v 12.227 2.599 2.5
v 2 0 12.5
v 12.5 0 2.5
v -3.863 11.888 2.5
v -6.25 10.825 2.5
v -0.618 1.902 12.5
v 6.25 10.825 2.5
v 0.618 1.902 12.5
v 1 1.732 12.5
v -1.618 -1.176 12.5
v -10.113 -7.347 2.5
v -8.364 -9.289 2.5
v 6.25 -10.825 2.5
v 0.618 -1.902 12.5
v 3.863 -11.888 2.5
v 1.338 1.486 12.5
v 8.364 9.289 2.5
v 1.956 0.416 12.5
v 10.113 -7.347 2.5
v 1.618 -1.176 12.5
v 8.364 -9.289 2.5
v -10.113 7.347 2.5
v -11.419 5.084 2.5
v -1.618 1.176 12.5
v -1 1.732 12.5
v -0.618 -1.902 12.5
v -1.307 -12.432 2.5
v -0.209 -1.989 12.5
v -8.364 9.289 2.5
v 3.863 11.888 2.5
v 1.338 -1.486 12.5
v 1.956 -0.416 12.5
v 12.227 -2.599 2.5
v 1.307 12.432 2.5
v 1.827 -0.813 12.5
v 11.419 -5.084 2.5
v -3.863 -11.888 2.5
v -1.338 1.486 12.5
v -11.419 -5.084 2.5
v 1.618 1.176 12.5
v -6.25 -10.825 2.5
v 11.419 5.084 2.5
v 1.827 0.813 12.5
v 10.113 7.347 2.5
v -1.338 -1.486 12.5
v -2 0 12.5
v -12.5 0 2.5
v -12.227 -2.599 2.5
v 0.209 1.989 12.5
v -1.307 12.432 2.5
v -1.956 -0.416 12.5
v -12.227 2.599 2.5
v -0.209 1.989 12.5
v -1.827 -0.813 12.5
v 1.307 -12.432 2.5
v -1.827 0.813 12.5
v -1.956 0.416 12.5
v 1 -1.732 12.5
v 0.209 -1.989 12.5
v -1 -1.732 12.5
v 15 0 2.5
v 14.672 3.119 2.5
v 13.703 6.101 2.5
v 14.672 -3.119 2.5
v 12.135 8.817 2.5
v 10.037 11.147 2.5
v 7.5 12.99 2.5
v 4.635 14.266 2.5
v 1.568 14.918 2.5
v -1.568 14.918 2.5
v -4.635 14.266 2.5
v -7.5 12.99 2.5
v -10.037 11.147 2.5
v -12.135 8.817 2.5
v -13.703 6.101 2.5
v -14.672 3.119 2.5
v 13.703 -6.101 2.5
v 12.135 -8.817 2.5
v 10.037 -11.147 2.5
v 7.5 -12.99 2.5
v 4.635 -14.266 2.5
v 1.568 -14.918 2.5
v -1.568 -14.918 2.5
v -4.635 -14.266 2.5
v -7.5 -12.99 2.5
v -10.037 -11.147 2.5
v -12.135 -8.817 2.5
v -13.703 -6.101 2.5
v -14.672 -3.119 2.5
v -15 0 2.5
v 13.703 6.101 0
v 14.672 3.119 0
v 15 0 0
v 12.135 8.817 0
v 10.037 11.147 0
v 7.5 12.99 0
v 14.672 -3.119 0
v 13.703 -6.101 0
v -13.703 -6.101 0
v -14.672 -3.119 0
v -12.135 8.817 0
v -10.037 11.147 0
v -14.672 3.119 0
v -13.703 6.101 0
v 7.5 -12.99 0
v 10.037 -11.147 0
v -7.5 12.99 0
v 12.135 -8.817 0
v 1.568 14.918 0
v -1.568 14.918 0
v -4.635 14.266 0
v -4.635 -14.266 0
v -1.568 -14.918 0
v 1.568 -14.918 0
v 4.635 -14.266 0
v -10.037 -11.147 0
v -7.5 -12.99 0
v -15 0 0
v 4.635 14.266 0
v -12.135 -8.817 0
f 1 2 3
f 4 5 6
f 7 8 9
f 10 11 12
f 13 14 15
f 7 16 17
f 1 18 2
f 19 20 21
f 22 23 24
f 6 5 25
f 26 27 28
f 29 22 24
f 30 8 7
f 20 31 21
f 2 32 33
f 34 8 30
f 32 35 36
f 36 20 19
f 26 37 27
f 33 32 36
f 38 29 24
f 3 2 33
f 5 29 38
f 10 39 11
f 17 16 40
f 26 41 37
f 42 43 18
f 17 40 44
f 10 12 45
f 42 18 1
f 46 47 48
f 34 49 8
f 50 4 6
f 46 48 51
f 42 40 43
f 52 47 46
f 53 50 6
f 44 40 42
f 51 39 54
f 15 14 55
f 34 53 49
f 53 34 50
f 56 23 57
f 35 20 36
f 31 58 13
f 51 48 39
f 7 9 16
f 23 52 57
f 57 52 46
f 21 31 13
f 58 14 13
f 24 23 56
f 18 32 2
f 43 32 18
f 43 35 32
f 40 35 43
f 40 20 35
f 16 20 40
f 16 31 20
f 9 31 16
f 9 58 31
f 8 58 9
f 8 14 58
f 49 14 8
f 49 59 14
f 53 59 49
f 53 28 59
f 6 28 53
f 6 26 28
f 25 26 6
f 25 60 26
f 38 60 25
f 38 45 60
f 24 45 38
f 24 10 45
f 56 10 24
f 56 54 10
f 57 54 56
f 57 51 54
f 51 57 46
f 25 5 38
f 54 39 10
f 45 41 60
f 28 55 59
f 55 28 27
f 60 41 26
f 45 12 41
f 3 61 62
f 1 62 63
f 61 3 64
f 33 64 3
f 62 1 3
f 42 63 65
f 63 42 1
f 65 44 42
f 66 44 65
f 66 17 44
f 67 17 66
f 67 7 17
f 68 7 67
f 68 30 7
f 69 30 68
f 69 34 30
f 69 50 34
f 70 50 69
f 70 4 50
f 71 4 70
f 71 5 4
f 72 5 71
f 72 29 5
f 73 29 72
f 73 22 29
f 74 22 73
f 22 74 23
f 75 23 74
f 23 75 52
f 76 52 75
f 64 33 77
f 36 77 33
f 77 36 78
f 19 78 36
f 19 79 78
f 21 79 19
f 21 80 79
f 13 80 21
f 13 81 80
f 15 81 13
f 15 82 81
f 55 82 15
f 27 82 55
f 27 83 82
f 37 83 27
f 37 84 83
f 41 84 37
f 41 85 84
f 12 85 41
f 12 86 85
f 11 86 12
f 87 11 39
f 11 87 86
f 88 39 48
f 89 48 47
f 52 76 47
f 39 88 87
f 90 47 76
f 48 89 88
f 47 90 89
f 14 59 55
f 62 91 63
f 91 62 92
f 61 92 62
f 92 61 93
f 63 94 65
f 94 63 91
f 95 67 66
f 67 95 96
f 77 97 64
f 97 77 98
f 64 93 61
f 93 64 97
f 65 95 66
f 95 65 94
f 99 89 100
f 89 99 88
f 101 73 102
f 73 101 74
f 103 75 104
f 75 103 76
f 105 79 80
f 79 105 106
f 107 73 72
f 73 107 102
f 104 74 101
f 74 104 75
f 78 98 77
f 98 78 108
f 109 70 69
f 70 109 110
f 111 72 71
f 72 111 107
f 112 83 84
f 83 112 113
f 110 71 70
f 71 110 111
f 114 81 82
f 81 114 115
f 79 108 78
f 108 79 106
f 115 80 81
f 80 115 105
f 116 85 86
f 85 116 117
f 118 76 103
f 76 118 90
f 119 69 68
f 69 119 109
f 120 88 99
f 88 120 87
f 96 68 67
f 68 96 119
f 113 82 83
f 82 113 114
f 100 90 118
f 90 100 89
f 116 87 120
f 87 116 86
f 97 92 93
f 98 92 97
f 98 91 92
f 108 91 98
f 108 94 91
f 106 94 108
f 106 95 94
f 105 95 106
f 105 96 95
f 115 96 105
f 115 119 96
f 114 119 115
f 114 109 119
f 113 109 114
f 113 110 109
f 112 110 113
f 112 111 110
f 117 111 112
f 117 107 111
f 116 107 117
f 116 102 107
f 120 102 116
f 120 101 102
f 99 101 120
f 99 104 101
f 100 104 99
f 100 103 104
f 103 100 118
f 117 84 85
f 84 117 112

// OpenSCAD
// Customizable spiked device foot
// Created by Kjell Kernen
// Date 14.1.2017

/*[Foot Parameters]*/

// of the foot in tens of mm:
base_height=25;// [0:200]

// of the foot in tens of mm:
base_overhang=25;// [0:30]

// of the spike in tens of mm:
diameter=250;      // [50:500]

// of the spike in tens of mm:
height=100;       // [50:500]

/*[Hidden]*/


union()
{
    translate([0,0,base_height/10]) cylinder(r=2, h=height/10, r1=diameter/20);	
    cylinder(r=((diameter + (base_overhang*2))/20), h=base_height/10);	
}
